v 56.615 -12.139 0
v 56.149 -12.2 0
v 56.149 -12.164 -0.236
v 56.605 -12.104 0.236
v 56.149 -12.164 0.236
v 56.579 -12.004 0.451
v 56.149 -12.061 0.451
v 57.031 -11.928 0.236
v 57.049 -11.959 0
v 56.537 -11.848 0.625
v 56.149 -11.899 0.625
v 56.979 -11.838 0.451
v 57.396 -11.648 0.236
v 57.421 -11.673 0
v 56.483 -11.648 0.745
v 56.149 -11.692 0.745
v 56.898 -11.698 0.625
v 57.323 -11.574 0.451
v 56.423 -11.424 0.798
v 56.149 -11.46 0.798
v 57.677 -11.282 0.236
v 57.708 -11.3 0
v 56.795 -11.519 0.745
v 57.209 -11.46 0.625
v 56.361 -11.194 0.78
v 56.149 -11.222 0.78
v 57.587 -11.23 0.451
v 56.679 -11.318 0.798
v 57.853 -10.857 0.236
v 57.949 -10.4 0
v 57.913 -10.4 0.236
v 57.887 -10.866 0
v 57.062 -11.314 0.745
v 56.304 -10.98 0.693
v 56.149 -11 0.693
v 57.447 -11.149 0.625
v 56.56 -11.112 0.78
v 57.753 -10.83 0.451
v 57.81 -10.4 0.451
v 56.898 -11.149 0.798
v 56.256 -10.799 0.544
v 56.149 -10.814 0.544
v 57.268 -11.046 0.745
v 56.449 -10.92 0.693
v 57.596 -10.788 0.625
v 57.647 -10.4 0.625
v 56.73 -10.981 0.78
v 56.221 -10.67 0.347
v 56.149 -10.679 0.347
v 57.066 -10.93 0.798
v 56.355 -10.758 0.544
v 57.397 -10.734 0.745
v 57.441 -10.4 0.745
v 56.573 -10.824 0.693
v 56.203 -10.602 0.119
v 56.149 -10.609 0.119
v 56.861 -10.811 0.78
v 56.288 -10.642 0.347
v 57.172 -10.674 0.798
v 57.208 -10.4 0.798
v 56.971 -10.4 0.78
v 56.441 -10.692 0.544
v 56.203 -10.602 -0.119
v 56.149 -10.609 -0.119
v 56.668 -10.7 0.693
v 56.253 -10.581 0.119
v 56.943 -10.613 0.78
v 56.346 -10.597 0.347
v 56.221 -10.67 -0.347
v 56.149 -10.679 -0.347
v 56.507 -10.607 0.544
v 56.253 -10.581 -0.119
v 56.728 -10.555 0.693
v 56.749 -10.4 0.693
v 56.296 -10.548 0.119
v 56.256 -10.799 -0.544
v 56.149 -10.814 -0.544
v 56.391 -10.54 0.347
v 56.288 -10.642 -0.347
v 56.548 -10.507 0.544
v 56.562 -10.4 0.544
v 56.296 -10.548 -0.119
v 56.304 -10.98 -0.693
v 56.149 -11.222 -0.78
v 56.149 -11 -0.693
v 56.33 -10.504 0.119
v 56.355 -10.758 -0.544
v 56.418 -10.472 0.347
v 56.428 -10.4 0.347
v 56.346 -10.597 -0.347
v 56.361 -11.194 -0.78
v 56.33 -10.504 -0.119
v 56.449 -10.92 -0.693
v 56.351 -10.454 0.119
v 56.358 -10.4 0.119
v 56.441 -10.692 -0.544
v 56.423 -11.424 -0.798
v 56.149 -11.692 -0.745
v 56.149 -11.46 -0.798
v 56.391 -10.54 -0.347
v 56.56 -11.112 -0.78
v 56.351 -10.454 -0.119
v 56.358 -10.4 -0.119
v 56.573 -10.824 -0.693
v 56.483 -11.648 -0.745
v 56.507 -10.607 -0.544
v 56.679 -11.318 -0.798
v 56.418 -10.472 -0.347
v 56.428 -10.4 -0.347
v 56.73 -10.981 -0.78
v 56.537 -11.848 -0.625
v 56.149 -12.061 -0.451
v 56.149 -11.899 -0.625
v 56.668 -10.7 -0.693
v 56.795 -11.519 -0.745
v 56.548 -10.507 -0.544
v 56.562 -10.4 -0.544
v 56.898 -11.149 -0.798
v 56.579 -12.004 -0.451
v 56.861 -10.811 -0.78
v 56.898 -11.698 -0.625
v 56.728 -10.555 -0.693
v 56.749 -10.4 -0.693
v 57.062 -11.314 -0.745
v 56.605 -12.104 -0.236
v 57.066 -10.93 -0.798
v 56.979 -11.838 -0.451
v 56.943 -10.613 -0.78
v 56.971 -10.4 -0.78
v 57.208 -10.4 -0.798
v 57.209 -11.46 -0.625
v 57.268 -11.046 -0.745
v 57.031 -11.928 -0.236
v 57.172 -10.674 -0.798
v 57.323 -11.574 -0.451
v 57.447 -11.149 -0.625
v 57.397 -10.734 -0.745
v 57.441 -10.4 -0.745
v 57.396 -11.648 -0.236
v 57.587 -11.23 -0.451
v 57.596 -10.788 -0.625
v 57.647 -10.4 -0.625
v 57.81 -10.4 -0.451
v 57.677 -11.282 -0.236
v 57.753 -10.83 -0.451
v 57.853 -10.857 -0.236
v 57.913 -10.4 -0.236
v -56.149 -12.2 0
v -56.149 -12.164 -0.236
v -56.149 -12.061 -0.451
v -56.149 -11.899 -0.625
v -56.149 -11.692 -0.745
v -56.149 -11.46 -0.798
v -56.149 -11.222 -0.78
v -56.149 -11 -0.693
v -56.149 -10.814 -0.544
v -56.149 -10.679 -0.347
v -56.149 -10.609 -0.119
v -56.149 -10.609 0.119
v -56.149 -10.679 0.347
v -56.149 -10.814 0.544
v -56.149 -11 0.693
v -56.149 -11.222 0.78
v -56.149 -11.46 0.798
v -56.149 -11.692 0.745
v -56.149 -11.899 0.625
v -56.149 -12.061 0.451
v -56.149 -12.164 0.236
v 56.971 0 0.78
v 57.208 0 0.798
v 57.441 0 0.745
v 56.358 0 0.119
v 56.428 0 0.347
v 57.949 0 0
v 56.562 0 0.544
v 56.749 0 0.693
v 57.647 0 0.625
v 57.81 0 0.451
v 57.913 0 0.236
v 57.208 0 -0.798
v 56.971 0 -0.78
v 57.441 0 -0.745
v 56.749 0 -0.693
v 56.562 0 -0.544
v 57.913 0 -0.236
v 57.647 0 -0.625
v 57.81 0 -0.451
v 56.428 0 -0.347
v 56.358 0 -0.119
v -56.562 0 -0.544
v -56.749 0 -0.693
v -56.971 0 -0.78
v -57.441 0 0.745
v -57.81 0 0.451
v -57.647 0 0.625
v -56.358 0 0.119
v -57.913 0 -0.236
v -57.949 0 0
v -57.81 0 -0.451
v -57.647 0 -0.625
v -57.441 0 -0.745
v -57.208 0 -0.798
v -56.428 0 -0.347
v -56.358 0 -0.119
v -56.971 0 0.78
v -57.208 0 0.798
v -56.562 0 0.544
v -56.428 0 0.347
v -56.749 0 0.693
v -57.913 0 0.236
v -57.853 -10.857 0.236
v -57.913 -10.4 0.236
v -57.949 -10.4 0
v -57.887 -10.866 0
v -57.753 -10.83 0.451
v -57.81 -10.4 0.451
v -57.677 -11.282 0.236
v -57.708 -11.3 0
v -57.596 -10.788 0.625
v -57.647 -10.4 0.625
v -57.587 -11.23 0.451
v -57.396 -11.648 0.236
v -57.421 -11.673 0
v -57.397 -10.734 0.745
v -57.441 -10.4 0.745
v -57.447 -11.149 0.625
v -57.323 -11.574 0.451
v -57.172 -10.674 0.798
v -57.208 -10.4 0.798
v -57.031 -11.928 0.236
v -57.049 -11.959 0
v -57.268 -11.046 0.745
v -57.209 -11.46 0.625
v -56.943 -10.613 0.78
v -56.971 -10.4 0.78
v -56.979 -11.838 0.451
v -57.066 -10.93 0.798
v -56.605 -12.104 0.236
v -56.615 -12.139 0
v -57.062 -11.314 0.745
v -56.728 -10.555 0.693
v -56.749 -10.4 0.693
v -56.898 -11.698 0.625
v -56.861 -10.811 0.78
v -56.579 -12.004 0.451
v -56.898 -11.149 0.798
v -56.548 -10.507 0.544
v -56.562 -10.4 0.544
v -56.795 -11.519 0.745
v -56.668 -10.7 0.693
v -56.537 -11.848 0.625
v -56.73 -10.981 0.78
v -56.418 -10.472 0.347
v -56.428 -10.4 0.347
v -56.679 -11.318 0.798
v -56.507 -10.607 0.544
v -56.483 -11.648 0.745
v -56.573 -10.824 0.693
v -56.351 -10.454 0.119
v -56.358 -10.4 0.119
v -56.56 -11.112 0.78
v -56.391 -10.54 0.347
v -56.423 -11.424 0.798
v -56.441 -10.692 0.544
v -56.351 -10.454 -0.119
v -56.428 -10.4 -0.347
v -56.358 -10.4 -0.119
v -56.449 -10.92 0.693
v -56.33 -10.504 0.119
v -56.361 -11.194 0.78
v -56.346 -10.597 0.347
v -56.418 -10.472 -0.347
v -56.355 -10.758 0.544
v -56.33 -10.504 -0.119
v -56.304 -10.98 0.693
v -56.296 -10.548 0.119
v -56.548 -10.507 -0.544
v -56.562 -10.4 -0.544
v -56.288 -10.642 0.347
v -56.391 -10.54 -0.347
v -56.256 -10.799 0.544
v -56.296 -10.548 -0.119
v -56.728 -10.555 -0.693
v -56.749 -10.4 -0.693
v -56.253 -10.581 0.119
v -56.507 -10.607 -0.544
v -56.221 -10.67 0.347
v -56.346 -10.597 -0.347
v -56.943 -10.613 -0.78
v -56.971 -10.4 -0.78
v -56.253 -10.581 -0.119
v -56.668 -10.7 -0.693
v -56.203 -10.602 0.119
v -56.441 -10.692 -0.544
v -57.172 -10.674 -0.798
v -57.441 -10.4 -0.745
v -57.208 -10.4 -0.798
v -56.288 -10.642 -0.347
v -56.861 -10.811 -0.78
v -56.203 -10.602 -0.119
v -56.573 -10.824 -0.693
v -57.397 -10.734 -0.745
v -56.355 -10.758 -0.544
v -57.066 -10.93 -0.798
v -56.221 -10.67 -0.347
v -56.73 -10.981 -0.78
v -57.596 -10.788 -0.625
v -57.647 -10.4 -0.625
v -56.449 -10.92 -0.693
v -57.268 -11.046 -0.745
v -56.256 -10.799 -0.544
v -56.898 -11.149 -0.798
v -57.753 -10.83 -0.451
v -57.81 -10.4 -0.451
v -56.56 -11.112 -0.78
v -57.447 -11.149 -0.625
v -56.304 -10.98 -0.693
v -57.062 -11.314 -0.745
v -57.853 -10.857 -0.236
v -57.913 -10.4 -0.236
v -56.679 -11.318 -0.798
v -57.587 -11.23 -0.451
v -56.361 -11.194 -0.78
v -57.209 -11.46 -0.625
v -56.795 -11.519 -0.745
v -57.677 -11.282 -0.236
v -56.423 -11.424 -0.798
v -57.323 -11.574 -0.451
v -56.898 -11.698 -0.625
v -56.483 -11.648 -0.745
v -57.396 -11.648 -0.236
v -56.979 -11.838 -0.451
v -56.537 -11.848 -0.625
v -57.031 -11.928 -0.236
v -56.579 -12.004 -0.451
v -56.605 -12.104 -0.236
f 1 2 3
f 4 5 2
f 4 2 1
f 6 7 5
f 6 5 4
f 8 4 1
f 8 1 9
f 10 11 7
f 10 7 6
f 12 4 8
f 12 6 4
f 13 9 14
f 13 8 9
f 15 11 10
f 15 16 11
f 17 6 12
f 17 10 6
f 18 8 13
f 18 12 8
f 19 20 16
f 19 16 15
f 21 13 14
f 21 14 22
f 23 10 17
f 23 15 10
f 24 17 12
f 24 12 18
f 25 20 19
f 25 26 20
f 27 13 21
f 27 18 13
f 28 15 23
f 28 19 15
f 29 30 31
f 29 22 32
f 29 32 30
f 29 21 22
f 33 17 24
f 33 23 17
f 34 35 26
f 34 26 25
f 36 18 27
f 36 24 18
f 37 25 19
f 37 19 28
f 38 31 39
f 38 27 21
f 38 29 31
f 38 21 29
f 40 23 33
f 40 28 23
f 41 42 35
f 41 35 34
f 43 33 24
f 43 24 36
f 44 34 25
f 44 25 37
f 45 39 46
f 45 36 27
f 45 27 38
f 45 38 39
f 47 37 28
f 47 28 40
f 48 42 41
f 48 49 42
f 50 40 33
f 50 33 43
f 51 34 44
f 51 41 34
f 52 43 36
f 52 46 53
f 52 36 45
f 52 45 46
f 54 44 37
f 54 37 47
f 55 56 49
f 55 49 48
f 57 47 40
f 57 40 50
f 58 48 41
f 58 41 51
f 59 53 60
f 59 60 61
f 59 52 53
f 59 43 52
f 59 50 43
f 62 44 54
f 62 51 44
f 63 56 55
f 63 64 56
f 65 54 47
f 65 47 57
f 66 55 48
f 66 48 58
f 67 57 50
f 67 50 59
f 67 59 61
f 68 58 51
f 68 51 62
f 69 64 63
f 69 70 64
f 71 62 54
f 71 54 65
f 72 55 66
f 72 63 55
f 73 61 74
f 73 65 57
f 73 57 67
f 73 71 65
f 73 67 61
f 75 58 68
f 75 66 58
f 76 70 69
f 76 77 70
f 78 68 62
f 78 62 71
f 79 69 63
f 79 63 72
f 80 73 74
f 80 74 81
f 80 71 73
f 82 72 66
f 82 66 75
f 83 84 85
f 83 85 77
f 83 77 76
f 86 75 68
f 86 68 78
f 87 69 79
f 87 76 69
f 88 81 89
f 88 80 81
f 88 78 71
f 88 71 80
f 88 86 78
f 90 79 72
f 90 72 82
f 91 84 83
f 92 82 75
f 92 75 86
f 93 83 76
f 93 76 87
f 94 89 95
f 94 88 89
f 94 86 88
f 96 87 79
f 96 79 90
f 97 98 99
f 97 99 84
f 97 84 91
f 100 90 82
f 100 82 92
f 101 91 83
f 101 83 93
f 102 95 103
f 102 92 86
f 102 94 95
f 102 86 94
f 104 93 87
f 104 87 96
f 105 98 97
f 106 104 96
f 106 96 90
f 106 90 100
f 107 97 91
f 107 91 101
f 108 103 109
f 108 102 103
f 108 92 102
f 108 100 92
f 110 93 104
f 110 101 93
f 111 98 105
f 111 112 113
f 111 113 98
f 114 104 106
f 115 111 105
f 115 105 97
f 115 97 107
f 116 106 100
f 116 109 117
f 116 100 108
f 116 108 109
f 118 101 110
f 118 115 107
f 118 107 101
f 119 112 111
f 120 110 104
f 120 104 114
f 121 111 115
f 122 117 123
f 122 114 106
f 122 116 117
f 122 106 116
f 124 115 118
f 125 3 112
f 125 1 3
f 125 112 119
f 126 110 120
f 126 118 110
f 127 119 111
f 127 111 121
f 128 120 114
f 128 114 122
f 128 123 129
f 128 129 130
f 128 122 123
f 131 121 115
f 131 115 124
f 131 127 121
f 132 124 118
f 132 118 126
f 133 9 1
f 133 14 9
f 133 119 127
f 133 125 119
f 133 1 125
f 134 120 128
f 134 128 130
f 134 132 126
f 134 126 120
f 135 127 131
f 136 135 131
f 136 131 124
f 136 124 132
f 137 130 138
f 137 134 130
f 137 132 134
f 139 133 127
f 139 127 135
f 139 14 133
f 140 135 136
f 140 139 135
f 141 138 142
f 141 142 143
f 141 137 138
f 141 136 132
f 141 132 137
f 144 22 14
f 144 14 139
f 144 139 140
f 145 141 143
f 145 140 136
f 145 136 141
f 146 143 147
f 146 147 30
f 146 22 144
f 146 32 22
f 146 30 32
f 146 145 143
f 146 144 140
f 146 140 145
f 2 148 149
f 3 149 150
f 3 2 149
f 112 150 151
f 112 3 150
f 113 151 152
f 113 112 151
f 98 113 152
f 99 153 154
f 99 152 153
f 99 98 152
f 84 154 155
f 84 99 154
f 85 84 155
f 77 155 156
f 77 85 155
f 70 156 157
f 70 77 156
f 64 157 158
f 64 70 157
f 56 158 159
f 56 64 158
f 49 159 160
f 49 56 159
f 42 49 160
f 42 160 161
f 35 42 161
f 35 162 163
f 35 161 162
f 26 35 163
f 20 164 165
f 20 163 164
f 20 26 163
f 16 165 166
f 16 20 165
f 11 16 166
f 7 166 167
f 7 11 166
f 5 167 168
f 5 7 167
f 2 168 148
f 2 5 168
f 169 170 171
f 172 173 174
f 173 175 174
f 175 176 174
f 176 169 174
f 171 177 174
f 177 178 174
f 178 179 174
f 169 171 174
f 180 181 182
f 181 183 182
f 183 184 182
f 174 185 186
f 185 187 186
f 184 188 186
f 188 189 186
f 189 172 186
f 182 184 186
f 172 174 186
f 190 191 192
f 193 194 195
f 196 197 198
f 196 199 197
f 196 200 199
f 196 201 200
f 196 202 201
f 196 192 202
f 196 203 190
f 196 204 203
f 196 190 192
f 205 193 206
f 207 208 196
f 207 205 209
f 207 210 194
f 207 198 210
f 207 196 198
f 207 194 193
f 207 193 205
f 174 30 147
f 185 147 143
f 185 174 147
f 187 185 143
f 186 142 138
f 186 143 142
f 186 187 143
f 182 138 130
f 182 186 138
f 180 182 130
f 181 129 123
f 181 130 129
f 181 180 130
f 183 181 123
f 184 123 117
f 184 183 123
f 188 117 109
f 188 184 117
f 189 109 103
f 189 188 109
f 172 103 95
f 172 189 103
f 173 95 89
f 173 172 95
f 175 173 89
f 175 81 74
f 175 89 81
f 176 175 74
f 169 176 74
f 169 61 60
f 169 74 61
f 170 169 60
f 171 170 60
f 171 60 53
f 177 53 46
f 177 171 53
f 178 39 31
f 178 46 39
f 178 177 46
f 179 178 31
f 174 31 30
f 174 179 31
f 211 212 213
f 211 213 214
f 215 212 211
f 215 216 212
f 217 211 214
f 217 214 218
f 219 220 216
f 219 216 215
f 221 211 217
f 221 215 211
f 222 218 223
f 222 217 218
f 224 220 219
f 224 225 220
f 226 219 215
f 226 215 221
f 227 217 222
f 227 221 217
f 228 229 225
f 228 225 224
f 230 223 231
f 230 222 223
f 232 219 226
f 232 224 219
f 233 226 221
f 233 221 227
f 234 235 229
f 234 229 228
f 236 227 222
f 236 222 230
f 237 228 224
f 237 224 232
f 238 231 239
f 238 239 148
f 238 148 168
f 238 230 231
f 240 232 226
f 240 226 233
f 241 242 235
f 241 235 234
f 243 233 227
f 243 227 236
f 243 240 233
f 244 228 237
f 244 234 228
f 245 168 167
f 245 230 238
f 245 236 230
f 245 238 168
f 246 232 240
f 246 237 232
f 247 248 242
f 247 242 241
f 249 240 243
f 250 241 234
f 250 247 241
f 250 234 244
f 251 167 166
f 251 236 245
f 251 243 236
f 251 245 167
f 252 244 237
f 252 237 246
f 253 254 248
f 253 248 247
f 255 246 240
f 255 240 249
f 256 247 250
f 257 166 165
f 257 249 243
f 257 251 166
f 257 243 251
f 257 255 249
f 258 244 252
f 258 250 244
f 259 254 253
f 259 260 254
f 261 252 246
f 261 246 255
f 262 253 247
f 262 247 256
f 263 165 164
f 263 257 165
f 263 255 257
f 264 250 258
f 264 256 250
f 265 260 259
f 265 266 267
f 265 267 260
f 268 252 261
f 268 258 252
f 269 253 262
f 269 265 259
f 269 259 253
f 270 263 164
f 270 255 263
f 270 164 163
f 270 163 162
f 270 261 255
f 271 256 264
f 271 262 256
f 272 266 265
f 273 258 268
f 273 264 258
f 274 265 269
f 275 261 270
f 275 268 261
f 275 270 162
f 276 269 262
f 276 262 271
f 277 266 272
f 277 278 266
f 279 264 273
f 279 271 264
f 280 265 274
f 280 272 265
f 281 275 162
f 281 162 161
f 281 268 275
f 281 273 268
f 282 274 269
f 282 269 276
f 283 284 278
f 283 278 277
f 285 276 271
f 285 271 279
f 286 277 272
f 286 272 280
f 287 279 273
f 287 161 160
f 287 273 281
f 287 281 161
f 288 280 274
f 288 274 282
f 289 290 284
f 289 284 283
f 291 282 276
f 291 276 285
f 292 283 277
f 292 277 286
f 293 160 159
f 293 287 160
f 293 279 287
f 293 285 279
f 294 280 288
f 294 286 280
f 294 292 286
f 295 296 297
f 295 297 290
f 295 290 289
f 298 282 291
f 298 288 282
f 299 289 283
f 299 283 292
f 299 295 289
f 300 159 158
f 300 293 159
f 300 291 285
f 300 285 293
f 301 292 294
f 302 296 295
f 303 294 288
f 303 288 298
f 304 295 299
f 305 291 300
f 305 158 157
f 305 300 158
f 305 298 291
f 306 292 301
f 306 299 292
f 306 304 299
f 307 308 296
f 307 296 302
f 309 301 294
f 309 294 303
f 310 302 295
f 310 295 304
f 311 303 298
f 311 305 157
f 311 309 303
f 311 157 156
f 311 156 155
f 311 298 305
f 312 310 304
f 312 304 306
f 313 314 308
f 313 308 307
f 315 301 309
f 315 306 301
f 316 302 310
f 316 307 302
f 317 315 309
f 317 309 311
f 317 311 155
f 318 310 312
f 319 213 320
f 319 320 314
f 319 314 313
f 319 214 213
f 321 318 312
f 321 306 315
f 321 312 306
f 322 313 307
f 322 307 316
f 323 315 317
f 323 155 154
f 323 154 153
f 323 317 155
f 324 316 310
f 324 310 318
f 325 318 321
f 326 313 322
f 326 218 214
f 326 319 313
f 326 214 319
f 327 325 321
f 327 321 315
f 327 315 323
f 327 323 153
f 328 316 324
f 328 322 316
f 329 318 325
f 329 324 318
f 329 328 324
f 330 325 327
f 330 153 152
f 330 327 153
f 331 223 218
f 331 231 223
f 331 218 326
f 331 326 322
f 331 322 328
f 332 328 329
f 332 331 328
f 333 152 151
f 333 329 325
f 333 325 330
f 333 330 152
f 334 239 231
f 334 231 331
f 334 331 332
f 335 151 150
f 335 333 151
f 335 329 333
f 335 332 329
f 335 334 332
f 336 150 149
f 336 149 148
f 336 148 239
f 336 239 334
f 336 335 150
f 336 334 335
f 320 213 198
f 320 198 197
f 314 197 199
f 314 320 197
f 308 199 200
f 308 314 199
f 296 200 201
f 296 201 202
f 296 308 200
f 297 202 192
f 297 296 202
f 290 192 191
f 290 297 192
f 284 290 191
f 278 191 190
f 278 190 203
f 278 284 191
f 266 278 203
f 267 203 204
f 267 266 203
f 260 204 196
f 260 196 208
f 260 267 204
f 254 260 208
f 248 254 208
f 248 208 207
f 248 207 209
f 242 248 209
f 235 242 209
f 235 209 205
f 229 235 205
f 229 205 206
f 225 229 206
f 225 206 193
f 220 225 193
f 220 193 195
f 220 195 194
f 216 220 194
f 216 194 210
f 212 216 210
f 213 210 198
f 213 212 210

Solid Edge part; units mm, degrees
sketch "Sketch1" plane through (0, 0, 0) normal (0, 0, 1) x (1, 0, 0)
  line L0 (57.1488, -10.4) -> (57.1487, 0)
  arc A0 (56.1487, -11.4) -> (57.1487, -10.4) centre (56.1487, -10.4) ccw
  line L1 (-56.1487, -11.4) -> (56.1487, -11.4)
  arc A1 (-57.1487, -10.4) -> (-56.1487, -11.4) centre (-56.1487, -10.4) ccw
  line L2 (-57.1487, 0) -> (-57.1487, -10.4)
  dimension "D1" = 114.2975
  dimension "D2" = 11.4
  dimension "D3" = 11.4
  dimension "D4" = 57.1487
  dimension "D5" = 1
  dimension "D6" = 1
sketch "Sketch2" plane through (0, 0, 0) normal (0, -1, 0) x (1, 0, 0)
  circle A0 centre (57.1487, 0) radius 0.8
  dimension "D1" = 1.6
sweep "Geführte_Ausprägung_1" add profiles "Sketch2" path "Sketch1"
